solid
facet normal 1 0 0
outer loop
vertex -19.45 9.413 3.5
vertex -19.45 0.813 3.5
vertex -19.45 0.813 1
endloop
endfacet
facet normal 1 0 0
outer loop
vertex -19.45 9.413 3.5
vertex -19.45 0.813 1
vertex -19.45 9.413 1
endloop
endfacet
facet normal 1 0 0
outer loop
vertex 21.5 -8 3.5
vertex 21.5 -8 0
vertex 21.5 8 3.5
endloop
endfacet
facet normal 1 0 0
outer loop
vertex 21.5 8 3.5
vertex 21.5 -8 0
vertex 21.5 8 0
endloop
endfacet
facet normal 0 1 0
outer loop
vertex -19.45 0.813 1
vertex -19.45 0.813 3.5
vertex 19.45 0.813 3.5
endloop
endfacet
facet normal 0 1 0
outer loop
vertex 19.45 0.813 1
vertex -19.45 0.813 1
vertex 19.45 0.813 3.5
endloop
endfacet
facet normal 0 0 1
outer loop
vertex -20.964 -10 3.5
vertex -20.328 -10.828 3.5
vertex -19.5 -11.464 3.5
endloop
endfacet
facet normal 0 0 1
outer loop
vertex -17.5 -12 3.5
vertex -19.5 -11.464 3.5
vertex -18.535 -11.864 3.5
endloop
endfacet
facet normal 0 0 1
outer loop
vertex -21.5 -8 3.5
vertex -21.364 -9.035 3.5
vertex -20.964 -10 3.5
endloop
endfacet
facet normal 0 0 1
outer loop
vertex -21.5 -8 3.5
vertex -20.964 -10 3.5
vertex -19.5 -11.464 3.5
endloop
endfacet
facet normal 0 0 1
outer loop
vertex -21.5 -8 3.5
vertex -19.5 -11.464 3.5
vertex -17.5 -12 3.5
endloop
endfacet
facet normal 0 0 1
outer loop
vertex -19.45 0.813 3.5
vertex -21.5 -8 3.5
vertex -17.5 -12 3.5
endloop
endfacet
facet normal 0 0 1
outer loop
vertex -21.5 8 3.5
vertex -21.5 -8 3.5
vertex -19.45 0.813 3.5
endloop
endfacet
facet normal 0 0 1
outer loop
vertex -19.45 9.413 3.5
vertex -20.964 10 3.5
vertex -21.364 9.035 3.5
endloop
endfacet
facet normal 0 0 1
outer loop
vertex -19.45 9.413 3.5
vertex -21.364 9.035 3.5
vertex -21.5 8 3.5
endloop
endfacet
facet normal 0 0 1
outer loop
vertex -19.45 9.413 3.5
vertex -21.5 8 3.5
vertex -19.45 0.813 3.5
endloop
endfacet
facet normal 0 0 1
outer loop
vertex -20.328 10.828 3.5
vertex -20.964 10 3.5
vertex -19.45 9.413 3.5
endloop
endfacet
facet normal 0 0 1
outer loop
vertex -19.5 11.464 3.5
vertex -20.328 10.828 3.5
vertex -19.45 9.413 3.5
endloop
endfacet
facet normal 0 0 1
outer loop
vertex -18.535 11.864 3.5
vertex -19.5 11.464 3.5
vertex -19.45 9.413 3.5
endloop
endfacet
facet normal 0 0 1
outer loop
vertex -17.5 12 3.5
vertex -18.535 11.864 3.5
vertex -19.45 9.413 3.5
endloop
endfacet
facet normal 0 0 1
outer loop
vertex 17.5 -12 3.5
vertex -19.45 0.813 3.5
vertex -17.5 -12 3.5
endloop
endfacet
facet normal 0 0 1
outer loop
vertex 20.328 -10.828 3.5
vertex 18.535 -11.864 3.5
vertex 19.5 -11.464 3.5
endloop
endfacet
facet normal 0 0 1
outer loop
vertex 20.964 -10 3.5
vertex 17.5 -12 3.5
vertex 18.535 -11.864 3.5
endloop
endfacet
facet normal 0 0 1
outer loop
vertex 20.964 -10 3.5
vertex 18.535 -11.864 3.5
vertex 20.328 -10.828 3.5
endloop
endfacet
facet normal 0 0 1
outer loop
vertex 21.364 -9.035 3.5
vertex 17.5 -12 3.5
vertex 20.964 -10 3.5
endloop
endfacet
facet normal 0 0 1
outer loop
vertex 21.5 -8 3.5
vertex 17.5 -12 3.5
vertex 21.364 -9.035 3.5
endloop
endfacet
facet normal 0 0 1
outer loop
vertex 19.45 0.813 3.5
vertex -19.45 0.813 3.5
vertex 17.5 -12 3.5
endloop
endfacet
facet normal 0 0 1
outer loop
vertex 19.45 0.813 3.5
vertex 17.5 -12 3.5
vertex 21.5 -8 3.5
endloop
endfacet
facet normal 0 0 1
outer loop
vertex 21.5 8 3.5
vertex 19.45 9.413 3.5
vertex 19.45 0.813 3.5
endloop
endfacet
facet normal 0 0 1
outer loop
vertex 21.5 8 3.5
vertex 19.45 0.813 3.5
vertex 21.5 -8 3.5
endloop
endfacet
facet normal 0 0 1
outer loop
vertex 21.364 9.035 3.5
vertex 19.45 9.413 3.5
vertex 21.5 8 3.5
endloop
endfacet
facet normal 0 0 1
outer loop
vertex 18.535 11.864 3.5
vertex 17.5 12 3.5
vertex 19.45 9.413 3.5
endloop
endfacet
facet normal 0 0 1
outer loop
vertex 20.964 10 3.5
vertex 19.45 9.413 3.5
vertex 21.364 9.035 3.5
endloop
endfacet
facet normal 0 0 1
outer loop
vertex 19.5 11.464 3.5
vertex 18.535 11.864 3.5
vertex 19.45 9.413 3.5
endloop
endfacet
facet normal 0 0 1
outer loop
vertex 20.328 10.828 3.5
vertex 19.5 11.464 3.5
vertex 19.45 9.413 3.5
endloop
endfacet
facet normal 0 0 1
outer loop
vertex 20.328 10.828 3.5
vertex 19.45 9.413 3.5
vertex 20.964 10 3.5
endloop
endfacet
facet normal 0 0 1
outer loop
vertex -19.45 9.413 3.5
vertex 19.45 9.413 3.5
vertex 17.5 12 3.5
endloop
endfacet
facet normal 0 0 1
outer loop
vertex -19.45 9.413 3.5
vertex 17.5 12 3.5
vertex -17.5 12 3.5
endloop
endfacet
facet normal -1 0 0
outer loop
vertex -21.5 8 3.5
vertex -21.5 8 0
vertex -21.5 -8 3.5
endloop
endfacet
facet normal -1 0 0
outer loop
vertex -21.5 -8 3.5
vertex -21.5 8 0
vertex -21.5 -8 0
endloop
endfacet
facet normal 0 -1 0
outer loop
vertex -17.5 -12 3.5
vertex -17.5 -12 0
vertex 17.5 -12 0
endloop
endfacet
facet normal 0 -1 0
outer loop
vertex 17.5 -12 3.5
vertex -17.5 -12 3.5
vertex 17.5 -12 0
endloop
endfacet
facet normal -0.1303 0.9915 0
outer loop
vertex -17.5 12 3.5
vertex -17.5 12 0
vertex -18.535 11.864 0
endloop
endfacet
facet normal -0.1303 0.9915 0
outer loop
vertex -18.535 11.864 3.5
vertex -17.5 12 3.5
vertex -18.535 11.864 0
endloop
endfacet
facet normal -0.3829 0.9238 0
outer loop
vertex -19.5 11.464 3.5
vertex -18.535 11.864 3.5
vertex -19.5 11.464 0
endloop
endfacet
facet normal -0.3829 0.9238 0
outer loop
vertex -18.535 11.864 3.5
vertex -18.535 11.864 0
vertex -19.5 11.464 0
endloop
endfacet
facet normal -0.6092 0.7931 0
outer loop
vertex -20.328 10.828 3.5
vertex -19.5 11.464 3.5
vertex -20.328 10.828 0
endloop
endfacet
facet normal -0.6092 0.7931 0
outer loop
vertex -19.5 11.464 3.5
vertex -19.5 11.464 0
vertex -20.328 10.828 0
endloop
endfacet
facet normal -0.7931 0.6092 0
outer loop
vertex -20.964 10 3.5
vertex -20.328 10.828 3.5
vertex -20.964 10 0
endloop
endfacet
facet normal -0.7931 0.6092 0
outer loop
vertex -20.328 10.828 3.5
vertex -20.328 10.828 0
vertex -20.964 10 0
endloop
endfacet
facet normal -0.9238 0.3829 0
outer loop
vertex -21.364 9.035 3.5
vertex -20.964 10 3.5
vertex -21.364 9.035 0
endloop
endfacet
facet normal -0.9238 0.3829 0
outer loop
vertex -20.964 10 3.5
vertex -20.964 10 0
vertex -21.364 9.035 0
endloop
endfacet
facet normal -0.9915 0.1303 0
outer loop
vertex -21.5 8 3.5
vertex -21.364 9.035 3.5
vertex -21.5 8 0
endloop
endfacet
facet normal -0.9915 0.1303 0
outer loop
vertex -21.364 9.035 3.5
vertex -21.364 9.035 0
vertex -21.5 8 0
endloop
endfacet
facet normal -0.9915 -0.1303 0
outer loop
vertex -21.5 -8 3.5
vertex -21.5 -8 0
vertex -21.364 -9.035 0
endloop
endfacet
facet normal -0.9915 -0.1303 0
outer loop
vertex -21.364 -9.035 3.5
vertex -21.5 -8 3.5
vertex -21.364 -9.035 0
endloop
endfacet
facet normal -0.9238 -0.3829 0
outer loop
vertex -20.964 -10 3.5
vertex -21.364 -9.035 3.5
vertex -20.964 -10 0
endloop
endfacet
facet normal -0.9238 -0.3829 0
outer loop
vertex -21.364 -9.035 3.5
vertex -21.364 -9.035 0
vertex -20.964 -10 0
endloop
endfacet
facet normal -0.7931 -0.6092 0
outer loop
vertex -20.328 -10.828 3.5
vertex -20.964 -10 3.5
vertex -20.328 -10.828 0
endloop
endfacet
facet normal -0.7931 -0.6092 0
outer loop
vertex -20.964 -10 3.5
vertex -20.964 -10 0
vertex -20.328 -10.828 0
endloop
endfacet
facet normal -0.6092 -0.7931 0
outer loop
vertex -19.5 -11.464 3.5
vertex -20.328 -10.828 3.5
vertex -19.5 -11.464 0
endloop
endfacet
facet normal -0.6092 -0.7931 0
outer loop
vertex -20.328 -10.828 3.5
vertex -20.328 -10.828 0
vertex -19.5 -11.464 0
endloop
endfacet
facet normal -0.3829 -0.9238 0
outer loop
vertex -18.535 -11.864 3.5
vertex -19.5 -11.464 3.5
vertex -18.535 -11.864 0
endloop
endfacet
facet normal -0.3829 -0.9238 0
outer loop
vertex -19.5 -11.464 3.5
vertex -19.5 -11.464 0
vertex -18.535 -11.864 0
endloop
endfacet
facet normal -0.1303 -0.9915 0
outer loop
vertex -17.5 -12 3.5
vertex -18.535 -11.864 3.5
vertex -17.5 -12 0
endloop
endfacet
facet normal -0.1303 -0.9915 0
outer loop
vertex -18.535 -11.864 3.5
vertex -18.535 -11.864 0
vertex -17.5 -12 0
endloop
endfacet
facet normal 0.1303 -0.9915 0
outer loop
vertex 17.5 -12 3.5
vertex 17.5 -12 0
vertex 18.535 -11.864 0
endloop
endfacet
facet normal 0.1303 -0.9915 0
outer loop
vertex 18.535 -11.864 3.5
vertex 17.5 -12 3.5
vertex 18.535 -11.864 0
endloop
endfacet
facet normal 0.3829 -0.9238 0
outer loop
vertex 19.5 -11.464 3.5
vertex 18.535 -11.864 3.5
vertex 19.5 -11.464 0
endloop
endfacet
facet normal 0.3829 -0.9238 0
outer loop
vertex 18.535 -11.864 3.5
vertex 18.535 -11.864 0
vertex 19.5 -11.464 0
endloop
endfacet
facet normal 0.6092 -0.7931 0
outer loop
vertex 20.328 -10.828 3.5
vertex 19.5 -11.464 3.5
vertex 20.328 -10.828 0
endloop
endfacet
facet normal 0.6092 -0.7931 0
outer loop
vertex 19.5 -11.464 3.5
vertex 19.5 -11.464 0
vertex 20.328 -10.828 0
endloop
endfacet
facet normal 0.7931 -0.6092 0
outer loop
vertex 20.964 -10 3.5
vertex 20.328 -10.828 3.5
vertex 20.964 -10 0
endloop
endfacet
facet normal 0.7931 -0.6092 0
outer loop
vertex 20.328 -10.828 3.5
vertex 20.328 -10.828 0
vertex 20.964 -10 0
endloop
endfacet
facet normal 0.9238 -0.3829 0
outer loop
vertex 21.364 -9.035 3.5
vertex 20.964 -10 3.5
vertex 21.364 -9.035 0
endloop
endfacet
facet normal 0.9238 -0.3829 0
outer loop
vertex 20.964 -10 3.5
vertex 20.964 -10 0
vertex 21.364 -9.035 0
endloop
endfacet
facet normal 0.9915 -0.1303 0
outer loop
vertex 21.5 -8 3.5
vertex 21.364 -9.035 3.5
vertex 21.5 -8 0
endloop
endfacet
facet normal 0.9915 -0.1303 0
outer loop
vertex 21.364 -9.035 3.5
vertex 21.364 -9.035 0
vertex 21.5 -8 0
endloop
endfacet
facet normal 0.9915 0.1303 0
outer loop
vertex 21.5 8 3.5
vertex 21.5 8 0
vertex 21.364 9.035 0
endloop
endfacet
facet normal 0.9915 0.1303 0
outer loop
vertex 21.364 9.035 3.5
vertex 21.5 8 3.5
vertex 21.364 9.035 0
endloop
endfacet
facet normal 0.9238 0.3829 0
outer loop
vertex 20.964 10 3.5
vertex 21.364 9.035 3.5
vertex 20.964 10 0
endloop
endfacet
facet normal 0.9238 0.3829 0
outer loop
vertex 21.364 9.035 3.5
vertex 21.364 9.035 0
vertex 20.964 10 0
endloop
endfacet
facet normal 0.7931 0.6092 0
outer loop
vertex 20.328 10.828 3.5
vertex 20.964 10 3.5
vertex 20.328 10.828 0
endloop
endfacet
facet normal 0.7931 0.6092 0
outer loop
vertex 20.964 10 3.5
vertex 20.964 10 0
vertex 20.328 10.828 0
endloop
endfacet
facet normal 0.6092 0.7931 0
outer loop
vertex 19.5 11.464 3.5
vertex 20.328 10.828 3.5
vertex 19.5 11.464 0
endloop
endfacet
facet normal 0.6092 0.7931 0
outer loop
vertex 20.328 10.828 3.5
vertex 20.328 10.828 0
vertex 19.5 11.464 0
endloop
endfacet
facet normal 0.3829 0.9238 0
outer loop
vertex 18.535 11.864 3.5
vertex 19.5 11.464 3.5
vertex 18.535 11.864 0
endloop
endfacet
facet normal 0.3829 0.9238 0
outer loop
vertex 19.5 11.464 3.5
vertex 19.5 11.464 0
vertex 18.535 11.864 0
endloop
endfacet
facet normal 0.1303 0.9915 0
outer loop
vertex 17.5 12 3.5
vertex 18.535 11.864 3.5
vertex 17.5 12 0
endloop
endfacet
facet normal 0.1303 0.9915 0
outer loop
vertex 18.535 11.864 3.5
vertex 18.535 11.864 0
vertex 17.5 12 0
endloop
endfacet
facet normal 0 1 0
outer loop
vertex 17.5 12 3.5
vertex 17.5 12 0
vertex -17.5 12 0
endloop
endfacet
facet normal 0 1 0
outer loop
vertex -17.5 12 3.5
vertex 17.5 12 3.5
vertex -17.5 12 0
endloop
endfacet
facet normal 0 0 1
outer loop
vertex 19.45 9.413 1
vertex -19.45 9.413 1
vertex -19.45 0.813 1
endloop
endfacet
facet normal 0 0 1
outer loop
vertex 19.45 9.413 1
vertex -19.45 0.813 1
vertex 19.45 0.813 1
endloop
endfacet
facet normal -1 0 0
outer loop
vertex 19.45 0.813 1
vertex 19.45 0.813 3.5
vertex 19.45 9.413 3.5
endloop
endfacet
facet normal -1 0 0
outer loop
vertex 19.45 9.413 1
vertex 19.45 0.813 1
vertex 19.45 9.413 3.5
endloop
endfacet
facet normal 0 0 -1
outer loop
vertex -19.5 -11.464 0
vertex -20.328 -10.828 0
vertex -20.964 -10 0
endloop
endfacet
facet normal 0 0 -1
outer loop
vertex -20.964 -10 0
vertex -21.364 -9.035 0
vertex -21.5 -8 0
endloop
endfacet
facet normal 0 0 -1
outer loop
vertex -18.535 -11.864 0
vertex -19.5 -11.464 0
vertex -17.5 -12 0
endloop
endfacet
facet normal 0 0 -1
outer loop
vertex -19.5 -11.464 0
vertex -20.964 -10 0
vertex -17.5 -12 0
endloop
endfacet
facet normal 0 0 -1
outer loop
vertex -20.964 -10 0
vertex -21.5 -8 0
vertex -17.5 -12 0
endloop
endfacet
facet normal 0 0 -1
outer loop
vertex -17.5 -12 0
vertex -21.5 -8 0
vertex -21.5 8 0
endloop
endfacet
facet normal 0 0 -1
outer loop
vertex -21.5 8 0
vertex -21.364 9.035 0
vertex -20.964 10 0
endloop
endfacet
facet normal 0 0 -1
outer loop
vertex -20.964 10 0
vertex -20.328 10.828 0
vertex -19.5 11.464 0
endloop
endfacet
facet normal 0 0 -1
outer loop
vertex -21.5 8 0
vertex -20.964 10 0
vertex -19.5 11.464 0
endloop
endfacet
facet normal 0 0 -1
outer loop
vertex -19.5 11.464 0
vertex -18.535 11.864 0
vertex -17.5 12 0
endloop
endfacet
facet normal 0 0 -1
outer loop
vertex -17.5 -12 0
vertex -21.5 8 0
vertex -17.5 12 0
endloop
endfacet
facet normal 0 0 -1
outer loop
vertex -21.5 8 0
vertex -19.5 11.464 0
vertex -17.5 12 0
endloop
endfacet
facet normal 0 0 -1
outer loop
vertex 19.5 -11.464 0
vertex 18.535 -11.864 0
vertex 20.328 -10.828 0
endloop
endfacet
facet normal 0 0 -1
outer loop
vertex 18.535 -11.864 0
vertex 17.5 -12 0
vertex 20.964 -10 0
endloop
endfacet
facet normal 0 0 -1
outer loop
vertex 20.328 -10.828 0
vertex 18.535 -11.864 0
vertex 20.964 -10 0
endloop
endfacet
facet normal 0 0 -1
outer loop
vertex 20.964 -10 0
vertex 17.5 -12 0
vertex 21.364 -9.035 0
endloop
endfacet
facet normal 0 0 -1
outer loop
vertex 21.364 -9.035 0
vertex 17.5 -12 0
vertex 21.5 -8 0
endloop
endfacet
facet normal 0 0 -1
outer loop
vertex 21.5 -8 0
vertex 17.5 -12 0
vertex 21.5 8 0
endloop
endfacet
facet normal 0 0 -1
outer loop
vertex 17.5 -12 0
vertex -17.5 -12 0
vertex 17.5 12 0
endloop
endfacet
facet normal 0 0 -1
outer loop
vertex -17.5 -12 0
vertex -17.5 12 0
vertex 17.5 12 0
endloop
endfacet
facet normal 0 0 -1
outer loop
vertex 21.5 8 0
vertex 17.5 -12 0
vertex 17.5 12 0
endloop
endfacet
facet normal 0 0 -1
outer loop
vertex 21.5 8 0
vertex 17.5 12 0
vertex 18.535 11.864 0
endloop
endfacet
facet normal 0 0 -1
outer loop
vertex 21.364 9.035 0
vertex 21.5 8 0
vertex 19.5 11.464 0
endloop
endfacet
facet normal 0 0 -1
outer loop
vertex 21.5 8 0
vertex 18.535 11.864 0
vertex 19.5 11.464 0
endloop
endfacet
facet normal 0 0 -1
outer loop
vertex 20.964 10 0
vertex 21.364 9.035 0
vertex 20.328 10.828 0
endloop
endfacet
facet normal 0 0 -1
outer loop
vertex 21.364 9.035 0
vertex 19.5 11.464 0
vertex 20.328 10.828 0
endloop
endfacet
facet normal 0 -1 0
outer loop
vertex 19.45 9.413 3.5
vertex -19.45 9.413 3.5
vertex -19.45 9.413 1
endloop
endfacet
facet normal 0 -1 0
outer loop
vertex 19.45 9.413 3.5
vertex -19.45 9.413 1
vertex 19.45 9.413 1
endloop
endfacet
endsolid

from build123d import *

# Parameters (mm, degrees)
F1_DEPTH = 3.5
F2_W     = 38.9
F2_H     = 8.6
F3_DEPTH = 2.5


with BuildPart() as f1:
    # F0 (on Top) → F1 (new body)
    with BuildSketch(Plane.XY):
        with BuildLine():
            Line((-17.5, -12), (17.5, -12))
            ThreePointArc((17.5, -12), (20.328427, -10.828427), (21.5, -8))
            Line((21.5, -8), (21.5, 8))
            ThreePointArc((21.5, 8), (20.328427, 10.828427), (17.5, 12))
            Line((17.5, 12), (-17.5, 12))
            ThreePointArc((-17.5, 12), (-20.328427, 10.828427), (-21.5, 8))
            Line((-21.5, 8), (-21.5, -8))
            ThreePointArc((-21.5, -8), (-20.328427, -10.828427), (-17.5, -12))
        make_face()
    extrude(amount=F1_DEPTH)

    # F2 (on face) → F3 (cut)
    with BuildSketch(Plane.XY.offset(3.5)):
        with Locations((0, 5.113459)):
            Rectangle(F2_W, F2_H)
    extrude(amount=-F3_DEPTH, mode=Mode.SUBTRACT)


solid = f1.part
